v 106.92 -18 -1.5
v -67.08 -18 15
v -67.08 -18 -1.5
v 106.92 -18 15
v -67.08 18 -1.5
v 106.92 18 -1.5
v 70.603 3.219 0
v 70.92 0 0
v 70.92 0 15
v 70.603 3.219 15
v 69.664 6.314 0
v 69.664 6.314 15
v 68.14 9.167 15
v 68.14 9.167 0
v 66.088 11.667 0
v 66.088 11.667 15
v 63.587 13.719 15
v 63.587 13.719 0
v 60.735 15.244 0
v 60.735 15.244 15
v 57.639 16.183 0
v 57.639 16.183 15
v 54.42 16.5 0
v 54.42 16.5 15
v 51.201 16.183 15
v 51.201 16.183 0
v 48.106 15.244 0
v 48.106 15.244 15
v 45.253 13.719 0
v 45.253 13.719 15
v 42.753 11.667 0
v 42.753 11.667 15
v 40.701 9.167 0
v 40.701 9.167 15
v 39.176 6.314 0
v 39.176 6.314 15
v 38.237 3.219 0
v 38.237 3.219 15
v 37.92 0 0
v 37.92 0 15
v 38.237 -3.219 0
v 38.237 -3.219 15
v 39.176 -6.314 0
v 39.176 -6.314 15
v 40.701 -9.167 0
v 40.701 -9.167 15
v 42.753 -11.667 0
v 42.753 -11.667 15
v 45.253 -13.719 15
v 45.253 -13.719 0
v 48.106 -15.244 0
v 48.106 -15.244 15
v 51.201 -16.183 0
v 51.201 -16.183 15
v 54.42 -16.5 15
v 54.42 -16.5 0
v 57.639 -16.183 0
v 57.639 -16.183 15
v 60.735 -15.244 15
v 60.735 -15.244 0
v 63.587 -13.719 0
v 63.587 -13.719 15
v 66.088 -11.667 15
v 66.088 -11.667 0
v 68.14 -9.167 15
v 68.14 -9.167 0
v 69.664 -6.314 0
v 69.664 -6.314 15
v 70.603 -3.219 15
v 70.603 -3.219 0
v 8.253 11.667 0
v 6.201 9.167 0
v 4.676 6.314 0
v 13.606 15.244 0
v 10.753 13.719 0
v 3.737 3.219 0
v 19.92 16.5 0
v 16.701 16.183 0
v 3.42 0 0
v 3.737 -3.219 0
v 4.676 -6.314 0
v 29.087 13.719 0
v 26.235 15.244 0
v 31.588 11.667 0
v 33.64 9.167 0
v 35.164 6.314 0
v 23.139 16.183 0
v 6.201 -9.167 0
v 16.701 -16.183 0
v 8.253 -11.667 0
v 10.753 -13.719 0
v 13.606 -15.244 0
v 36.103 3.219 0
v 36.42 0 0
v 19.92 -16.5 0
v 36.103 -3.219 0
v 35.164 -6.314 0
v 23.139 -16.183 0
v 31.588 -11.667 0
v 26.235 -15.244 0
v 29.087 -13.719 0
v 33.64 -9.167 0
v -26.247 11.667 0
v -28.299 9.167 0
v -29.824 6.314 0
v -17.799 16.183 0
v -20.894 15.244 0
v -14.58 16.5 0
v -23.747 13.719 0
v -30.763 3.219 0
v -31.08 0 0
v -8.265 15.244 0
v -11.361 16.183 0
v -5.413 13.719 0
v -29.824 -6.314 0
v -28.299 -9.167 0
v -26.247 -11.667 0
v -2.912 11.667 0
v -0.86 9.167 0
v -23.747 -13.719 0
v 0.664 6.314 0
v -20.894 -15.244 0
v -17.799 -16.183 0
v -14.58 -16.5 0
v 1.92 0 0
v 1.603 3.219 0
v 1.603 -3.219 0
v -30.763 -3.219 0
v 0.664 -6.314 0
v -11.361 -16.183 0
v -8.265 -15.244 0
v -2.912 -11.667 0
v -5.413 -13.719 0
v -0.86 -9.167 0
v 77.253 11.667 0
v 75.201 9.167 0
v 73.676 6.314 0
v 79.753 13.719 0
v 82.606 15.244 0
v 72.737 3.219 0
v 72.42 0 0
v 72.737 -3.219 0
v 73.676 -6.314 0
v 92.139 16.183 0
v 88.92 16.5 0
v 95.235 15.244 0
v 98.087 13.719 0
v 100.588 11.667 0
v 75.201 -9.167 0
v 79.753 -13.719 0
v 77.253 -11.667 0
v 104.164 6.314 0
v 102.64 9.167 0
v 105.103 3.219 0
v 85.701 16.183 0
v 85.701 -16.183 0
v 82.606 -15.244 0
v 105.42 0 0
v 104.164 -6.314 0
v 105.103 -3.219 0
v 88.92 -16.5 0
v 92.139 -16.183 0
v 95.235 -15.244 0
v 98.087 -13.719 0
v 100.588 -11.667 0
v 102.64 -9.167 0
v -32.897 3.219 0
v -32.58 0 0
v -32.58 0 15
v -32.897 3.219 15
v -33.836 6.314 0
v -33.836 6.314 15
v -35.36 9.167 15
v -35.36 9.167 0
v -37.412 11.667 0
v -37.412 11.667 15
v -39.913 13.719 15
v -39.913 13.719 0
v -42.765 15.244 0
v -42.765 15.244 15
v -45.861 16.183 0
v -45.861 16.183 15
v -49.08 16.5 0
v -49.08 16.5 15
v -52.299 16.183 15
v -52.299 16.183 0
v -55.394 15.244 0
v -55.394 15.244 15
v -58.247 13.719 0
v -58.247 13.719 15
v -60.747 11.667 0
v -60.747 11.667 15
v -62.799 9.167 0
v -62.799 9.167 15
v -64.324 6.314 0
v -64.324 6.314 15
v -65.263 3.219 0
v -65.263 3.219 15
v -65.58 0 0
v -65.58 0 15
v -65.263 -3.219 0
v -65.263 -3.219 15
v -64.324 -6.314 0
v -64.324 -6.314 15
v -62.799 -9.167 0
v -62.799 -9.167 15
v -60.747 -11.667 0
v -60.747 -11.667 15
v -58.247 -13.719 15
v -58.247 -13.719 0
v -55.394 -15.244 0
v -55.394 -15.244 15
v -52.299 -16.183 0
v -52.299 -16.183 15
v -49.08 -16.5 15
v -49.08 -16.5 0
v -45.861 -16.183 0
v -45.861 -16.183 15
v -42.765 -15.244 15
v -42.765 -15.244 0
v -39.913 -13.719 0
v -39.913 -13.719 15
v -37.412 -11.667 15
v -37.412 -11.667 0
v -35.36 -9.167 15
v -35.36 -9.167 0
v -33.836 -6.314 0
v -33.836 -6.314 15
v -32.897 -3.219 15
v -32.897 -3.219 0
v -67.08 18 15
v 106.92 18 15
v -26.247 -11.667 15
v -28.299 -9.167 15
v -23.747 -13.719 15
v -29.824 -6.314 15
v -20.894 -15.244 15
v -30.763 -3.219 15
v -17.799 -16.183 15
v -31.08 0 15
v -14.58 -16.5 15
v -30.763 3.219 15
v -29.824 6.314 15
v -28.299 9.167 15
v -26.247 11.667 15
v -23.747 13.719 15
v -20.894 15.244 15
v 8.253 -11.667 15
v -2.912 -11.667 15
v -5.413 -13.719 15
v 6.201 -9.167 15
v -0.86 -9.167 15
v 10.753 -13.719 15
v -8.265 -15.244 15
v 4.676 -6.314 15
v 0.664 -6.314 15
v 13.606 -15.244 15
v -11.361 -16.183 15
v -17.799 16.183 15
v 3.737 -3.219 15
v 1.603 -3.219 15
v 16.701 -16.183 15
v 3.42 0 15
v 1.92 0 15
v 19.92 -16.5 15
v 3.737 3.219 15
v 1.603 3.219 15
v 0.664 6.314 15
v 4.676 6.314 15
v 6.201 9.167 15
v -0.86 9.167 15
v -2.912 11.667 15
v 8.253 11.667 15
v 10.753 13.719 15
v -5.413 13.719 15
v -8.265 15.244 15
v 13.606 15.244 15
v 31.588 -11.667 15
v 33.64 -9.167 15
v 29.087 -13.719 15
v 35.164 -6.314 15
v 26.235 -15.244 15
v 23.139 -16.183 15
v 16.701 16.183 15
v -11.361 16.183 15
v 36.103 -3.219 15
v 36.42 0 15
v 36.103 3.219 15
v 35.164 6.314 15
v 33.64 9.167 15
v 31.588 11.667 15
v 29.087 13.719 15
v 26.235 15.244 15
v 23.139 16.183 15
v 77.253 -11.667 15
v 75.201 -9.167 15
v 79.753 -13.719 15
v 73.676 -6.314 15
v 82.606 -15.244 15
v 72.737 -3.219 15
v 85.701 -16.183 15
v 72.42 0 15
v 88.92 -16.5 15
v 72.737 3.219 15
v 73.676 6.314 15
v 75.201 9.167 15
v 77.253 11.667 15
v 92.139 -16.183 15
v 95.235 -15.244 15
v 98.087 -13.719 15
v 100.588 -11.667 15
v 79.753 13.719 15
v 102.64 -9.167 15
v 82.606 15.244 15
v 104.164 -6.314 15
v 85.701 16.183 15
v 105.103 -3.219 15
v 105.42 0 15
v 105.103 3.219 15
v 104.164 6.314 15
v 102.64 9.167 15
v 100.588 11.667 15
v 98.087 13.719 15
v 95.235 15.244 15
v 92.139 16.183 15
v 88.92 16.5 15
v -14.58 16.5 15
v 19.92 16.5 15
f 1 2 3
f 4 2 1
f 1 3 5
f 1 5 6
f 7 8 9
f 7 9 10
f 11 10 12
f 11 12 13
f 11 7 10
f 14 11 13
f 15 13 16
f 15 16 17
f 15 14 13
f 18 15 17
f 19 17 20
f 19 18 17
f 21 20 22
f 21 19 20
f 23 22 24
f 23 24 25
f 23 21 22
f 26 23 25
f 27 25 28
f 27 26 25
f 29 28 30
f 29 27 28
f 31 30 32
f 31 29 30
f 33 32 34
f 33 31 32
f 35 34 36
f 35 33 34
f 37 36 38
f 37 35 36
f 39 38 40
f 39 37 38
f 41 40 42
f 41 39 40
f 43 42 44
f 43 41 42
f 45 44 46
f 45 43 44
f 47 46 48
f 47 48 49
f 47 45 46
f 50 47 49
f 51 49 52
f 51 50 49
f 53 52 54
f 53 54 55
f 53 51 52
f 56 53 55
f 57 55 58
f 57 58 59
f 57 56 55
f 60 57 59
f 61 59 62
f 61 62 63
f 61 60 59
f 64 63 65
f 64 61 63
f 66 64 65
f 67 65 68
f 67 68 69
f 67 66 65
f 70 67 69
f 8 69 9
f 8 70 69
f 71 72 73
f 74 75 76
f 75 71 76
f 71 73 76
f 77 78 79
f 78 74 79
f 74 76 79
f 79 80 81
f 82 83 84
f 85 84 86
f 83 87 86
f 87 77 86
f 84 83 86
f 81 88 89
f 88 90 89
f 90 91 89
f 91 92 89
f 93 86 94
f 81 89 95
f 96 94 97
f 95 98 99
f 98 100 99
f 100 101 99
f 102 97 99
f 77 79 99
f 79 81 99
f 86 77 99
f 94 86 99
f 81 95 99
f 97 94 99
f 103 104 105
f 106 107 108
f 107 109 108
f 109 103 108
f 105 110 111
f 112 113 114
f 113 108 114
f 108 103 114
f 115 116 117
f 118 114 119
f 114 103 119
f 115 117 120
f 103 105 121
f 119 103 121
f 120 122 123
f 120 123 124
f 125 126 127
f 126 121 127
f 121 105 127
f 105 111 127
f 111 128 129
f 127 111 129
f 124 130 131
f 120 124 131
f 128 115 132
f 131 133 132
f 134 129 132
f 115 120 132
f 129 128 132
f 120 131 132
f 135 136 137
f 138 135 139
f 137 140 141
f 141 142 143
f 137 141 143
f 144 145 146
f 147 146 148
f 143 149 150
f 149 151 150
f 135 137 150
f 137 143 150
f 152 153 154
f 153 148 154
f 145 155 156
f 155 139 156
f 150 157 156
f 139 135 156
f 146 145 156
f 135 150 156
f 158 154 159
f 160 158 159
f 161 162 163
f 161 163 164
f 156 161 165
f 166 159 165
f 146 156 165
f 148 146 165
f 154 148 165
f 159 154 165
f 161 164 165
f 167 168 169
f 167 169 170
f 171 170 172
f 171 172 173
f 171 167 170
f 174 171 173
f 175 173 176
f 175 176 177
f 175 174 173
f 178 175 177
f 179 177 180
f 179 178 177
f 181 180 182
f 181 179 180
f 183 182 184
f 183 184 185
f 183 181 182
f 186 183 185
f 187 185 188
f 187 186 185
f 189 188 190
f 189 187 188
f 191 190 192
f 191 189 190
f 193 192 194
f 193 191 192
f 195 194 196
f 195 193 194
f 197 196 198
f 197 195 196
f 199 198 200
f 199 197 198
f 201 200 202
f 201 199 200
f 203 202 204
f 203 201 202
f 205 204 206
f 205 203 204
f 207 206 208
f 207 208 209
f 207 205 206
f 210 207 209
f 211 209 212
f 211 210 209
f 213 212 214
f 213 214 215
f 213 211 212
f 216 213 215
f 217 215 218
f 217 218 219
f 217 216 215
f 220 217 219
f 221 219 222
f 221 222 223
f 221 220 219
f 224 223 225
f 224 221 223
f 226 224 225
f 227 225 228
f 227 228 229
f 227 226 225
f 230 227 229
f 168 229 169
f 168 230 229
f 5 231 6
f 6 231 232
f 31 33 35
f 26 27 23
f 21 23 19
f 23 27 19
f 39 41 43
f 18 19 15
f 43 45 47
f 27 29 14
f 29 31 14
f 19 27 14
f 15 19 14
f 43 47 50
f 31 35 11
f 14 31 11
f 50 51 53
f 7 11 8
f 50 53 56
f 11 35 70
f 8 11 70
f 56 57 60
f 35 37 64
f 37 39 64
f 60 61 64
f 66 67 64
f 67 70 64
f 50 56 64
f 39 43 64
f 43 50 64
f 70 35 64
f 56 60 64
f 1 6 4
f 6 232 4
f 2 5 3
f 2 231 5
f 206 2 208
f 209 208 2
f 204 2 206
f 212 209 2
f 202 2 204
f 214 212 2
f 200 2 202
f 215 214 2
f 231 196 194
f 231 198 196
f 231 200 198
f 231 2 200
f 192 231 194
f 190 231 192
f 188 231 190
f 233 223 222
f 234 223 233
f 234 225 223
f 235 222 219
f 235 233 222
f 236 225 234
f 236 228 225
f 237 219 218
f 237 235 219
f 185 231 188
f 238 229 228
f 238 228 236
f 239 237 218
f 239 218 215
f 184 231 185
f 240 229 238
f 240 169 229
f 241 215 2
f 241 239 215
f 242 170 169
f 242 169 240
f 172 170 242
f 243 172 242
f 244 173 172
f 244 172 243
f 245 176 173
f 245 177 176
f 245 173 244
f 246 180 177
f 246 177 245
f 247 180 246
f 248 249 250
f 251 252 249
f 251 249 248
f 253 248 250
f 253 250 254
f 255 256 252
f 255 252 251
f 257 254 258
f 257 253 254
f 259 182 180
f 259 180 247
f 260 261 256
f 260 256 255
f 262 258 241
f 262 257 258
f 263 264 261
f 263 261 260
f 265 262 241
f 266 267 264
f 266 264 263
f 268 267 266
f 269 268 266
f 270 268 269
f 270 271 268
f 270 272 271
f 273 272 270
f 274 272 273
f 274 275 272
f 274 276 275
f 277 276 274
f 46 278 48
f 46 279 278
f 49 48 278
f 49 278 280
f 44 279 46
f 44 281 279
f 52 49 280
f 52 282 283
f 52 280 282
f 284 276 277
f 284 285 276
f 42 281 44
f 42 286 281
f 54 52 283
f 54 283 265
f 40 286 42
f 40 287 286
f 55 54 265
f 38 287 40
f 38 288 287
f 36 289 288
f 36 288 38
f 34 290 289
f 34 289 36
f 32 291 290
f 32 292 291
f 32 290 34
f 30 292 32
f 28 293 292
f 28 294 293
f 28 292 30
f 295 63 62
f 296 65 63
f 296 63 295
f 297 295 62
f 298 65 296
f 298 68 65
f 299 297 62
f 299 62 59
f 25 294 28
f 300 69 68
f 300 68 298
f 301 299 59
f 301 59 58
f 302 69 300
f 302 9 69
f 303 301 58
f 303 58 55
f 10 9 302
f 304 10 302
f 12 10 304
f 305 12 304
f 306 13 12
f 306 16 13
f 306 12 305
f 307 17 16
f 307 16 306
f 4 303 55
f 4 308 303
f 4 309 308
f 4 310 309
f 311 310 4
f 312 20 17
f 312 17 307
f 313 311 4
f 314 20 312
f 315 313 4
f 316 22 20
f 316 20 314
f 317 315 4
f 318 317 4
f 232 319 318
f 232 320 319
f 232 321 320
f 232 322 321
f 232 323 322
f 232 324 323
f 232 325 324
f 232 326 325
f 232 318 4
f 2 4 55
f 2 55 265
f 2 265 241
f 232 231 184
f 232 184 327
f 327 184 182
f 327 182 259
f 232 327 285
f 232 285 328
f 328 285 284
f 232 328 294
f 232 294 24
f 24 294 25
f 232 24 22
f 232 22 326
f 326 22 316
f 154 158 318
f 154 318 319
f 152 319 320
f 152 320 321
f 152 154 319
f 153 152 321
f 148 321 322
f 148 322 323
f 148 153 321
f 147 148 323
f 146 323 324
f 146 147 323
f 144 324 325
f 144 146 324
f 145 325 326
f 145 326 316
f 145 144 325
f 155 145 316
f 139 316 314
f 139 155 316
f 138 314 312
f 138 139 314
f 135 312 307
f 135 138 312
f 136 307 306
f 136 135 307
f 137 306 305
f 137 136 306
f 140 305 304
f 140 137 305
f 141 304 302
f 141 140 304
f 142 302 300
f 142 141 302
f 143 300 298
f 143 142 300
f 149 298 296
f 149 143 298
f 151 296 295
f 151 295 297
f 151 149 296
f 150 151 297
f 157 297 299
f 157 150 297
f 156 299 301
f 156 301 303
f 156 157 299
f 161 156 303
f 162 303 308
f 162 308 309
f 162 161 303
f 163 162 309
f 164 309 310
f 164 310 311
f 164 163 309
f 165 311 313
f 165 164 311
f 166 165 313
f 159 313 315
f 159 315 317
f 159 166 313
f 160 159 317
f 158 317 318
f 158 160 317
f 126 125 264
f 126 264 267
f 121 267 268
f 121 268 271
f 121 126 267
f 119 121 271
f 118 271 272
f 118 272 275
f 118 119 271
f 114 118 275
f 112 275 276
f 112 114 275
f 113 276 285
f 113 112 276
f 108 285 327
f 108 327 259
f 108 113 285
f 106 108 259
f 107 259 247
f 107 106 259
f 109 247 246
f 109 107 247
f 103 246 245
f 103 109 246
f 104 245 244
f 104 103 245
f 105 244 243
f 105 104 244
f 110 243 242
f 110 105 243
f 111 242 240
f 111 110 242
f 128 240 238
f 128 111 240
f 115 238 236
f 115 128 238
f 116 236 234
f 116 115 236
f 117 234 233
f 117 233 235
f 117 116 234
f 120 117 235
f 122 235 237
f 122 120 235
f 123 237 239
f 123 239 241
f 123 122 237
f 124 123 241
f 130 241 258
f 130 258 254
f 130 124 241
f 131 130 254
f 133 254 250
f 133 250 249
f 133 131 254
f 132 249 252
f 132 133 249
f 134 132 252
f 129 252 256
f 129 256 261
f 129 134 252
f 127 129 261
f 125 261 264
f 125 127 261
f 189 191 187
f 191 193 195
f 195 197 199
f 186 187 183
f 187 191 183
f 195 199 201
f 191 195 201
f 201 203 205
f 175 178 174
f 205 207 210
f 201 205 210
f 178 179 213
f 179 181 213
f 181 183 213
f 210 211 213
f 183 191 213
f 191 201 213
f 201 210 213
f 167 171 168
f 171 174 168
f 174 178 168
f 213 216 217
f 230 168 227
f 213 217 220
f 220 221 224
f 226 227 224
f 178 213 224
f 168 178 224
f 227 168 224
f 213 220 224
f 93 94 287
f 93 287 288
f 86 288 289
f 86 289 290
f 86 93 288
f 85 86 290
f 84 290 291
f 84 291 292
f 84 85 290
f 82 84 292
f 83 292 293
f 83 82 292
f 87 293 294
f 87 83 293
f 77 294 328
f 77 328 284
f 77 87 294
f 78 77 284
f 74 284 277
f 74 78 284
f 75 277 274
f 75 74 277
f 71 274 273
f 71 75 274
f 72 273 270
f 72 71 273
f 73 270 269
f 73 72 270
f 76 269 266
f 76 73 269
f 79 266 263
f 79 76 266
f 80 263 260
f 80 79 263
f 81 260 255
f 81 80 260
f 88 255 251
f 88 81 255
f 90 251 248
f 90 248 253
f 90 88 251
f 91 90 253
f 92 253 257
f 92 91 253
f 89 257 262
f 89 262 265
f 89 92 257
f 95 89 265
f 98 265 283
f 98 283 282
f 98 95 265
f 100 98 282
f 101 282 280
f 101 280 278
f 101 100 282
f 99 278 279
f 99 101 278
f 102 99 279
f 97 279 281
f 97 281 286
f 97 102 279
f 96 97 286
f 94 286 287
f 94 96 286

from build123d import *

# Parameters (mm, degrees)
F0_W     = 174
F0_H     = 36
F0_R     = 16.5
F1_DEPTH = 15
F2_W     = 174
F2_H     = 36
F3_DEPTH = 1.5


with BuildPart() as f1:
    # F0 (on Top) → F1 (new body)
    with BuildSketch(Plane.XY):
        with Locations((19.920273, 0)):
            Rectangle(F0_W, F0_H)
        with Locations((-49.079727, 0)):
            Circle(F0_R, mode=Mode.SUBTRACT)
        with Locations((-14.579727, 0)):
            Circle(F0_R, mode=Mode.SUBTRACT)
        with Locations((19.920273, 0)):
            Circle(F0_R, mode=Mode.SUBTRACT)
        with Locations((54.420273, 0)):
            Circle(F0_R, mode=Mode.SUBTRACT)
        with Locations((88.920273, 0)):
            Circle(F0_R, mode=Mode.SUBTRACT)
    extrude(amount=F1_DEPTH)

    # F2 (on face) → F3 (join)
    with BuildSketch(Plane(origin=(0, 0, 0), x_dir=(1, 0, 0), z_dir=(0, 0, -1))):
        with Locations((19.920273, 0)):
            Rectangle(F2_W, F2_H)
    extrude(amount=F3_DEPTH)


solid = f1.part
